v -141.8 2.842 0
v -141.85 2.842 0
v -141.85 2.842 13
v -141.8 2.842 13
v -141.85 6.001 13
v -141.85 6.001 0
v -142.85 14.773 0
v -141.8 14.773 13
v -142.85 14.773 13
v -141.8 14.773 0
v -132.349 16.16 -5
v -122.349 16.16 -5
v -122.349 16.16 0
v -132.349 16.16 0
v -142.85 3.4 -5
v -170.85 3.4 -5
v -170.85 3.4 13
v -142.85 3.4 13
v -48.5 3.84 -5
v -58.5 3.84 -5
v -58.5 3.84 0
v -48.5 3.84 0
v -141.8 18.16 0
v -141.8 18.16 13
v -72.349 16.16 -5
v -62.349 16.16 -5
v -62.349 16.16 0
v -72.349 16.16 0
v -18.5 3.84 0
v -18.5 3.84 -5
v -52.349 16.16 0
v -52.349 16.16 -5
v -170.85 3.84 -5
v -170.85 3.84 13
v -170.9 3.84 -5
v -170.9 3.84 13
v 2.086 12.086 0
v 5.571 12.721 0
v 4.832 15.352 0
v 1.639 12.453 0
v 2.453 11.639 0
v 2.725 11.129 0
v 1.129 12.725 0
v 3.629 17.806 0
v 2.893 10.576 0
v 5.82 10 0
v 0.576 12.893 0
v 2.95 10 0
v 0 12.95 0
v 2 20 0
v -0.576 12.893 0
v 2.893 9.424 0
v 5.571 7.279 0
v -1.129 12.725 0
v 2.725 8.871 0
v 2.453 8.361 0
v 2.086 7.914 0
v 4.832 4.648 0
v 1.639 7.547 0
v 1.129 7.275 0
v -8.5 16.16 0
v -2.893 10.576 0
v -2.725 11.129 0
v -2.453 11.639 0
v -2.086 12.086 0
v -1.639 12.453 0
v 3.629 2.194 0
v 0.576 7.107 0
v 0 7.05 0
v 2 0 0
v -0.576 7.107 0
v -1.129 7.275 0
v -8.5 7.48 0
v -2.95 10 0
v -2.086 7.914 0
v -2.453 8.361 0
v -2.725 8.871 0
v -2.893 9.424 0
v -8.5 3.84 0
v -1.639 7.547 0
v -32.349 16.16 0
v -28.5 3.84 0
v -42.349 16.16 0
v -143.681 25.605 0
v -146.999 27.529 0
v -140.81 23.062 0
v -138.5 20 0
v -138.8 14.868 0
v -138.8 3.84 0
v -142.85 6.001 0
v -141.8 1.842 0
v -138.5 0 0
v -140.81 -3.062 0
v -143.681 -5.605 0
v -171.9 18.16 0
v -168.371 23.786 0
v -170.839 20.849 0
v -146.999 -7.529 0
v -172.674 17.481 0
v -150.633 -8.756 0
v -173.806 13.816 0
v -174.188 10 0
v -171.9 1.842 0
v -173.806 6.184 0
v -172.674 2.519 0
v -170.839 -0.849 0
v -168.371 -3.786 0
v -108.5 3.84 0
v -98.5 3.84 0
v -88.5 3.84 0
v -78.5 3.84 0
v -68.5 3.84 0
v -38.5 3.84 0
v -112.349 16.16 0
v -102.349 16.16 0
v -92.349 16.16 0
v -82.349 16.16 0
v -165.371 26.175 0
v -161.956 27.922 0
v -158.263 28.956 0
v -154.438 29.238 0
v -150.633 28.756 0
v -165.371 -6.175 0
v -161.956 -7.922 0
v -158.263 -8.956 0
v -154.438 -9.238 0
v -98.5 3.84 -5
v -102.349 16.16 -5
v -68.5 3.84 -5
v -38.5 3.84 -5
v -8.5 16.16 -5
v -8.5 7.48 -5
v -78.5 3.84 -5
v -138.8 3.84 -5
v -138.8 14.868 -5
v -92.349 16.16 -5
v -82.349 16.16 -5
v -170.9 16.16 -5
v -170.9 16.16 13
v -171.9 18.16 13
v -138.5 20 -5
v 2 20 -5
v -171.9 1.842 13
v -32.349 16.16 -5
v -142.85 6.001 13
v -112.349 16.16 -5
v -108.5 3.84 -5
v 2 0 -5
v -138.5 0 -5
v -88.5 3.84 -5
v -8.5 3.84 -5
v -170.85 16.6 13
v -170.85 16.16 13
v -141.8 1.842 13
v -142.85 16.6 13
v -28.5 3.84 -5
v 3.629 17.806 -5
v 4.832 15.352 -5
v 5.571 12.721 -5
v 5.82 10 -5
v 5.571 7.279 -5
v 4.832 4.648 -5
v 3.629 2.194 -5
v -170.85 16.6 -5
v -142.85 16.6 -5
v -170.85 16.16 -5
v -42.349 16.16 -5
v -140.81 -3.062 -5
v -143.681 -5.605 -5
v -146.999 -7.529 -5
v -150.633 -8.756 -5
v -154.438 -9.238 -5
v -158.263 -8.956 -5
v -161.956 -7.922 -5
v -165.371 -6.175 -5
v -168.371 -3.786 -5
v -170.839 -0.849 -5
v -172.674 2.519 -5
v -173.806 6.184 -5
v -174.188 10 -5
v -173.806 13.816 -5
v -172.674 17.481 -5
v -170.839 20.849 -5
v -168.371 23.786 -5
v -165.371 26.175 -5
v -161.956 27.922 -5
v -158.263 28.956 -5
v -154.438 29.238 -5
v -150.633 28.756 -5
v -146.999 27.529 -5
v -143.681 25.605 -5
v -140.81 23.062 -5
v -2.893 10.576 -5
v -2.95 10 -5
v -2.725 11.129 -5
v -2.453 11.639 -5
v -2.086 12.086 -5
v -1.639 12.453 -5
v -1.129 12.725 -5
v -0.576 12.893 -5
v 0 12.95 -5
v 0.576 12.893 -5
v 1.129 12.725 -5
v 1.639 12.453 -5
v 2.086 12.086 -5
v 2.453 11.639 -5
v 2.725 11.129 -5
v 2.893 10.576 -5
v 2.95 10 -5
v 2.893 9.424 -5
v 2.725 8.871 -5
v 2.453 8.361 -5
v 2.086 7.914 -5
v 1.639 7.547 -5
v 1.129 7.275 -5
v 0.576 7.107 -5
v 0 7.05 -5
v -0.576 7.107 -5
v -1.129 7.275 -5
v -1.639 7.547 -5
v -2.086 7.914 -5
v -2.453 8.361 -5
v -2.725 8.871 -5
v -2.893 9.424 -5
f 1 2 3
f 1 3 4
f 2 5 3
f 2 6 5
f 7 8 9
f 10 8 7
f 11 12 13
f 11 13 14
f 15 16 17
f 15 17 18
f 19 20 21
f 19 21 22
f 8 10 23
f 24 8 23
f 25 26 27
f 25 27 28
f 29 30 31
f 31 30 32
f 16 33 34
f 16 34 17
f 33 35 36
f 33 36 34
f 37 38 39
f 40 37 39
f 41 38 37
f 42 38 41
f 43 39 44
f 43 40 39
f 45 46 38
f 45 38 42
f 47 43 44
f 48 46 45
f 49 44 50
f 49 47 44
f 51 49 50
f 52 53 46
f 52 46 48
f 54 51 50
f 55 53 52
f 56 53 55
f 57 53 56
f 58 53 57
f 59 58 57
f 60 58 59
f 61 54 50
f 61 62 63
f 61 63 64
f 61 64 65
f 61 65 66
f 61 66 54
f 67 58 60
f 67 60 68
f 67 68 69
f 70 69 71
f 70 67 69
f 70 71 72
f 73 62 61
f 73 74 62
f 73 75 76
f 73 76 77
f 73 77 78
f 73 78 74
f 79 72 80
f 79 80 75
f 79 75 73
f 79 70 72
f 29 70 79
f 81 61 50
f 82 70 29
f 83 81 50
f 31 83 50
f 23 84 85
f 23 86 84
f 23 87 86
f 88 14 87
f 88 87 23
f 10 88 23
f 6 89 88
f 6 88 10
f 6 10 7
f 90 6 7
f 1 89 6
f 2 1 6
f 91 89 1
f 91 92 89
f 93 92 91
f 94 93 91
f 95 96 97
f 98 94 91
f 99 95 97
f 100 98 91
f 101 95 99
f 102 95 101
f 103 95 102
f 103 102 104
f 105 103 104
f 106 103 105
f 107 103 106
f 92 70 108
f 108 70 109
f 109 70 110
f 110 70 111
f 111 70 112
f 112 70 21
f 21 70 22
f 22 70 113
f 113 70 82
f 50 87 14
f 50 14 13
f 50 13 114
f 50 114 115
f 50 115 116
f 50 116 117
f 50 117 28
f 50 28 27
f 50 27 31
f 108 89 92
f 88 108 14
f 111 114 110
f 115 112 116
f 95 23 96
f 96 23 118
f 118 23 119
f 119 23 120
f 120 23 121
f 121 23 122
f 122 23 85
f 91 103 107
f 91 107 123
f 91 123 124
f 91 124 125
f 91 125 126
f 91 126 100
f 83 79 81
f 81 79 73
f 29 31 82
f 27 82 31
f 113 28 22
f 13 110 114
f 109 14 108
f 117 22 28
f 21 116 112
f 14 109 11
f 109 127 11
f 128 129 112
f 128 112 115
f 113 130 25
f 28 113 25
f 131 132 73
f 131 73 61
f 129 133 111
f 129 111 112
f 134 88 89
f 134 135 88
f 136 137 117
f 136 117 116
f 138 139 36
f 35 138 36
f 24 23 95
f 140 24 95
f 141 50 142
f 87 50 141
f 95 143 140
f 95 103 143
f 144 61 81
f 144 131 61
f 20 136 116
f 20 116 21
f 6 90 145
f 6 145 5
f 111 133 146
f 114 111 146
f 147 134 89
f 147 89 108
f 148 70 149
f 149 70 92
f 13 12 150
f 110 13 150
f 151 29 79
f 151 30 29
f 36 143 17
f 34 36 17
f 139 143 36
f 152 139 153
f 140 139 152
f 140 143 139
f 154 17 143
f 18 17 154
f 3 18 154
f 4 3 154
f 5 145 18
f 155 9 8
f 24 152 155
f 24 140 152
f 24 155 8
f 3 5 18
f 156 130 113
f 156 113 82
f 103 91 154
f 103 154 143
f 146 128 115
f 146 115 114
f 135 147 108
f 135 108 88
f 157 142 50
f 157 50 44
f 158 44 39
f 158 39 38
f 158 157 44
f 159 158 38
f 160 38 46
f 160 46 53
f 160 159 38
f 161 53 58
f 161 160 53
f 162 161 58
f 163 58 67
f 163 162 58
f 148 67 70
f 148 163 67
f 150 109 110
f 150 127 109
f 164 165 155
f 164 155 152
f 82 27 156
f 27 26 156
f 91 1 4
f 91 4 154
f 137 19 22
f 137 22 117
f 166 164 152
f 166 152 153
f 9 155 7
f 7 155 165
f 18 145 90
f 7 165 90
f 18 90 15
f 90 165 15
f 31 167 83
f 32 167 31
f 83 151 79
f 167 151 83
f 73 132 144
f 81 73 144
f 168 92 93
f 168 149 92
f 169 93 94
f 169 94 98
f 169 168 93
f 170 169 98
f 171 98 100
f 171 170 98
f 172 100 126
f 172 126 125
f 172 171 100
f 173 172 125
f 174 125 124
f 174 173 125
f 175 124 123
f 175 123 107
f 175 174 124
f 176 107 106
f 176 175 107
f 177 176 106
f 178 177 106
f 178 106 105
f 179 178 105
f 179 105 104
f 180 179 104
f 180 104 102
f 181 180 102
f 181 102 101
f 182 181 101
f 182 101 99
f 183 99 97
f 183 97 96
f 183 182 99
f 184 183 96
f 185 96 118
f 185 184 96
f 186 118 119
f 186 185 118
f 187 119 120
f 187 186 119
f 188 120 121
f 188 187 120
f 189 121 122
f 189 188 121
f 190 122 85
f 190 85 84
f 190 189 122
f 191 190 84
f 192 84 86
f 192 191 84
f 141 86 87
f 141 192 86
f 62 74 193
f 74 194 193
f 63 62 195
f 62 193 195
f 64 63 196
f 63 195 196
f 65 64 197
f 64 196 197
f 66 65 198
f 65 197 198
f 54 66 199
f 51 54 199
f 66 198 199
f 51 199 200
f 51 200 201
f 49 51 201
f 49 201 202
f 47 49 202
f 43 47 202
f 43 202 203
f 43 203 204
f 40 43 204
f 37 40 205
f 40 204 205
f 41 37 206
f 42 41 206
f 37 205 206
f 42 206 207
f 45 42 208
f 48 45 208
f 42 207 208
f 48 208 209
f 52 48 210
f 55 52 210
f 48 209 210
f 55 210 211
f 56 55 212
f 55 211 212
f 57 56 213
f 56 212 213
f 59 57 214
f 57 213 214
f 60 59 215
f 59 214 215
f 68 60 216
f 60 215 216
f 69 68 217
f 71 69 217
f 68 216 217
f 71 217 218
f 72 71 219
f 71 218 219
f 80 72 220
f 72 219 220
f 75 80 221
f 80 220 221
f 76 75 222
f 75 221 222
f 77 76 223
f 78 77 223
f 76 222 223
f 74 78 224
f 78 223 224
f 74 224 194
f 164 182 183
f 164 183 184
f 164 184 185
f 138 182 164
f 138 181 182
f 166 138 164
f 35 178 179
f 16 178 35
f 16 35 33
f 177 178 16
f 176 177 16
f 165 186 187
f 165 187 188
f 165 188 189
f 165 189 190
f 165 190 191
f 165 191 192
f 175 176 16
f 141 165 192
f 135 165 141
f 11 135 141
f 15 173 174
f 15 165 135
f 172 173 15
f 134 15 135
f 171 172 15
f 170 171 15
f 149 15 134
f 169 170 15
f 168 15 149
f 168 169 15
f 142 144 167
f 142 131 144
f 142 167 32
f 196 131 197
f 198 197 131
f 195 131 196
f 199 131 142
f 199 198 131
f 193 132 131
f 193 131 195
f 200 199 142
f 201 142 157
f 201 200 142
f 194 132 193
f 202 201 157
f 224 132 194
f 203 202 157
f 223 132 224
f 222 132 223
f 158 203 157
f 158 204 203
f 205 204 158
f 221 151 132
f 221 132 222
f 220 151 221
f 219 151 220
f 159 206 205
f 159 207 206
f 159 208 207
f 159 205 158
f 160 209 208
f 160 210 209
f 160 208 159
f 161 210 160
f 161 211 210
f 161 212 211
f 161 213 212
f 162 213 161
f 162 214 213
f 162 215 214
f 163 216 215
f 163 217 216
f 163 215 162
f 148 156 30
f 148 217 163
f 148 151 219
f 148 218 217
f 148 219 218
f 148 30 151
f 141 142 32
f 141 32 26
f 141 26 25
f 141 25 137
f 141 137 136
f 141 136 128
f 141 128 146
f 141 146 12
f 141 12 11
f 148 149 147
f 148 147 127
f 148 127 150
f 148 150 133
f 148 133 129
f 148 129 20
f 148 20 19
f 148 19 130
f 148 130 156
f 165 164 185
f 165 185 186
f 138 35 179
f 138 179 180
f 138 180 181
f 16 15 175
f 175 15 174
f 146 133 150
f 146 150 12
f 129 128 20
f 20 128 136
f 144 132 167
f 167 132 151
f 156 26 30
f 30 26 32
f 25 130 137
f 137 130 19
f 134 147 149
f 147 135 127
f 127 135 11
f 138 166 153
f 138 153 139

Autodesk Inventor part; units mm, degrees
ref_plane "YZ Plane" through (0, 0, 0) normal (1, 0, 0) x (0, 1, 0)
ref_plane "XZ Plane" through (0, 0, 0) normal (0, 1, 0) x (-1, 0, 0)
ref_plane "XY Plane" through (0, 0, 0) normal (0, 0, 1) x (1, 0, 0)
sketch "Szkic1" plane through (0, 0, 0) normal (0, 1, 0) x (-1, 0, 0)
  line L0 (0, 0) -> (150, 0)
  line L1 (150, 0) -> (150, -5)
  line L2 (150, -5) -> (0, -5)
  line L3 (0, -5) -> (0, 0)
  dimension "d0" = 150
  dimension "d1" = 5
extrude "Wyciągnięcie proste1" add sketch "Szkic1" along normal blind 20
sketch "Szkic2" plane through (0, 0, -5) normal (0, 0, -1) x (-1, 0, 0)
  line L0 (0, 0) -> (0, 20) projected
  circle A0 centre (0, 10) radius 2.95
  line L1 (0, 20) -> (-2, 20)
  line L2 (0, 0) -> (-2, 0)
  arc A1 (-2, 20) -> (-2, 0) centre (9.1803, 10) ccw
  line L3 (0, 10) -> (150, 10)
  line L4 (150, 10) -> (138.5, 10)
  line L5 (138.5, 10) -> (170.9, 10)
  line L6 (150, 0) -> (150, 20) projected
  line L7 (138.5, 10) -> (170.9, 10) construction
  line L8 (138.5, 10) -> (170.9, 10)
  line L9 (170.9, 10) -> (170.9, 16.16)
  line L10 (170.9, 16.16) -> (138.5, 16.16)
  line L11 (138.5, 16.16) -> (138.5, 10)
  line L12 (138.5, 10) -> (170.9, 10)
  line L13 (170.9, 10) -> (170.9, 3.84)
  line L14 (170.9, 3.84) -> (138.5, 3.84)
  line L15 (138.5, 3.84) -> (138.5, 10)
  line L16 (0, 0) -> (150, 0) projected
  line L17 (0, 20) -> (150, 20) projected
  arc A2 (138.5, 0) -> (138.5, 20) centre (154.9429, 10) ccw
  point P0 (150, 3.84)
  point P1 (150, 16.16)
  point P2 (0, 7.05)
  point P3 (0, 12.95)
  dimension "d4" = 5.9
  dimension "d5" = 2
  dimension "d6" = 2
  dimension "d7" = 15
  dimension "d8" = 150
  dimension "d9" = 11.5
  dimension "d10" = 32.4
  dimension "d11" = 0
  dimension "d12" = 6.16
  dimension "d13" = 6.16
extrude "Wyciągnięcie proste2" add sketch "Szkic2" against normal blind 5 contours L2 A1 L1 L0 A0 | L16 L6 L14 L13 L9 L10 L17 A2
sketch "Szkic3" plane through (2, 20, -5) normal (0, 0, -1) x (-1, 0, 0)
  arc A0 (2, -7.05) -> (2, -12.95) centre (2, -10) ccw projected
  circle A1 centre (2, -10) radius 2.95
  line L0 (152, -16.16) -> (152, -3.84) projected
  line L1 (152, -16.16) -> (150.5, -16.16)
  line L2 (150.5, -16.16) -> (150.5, -3.84)
  line L3 (150.5, -3.84) -> (152, -3.84)
  line L4 (140.5, -16.16) -> (10.5, -16.16)
  line L5 (10.5, -16.16) -> (10.5, -3.84)
  line L6 (10.5, -3.84) -> (140.5, -3.84)
  line L7 (140.5, -3.84) -> (140.5, -16.16)
  line L8 (150.5, -16.16) -> (150.3, -16.16)
  line L9 (150.3, -16.16) -> (150.3, -3.84)
  line L10 (150.3, -3.84) -> (150.5, -3.84)
  line L11 (152, -16.16) -> (140.5, -16.16)
  line L12 (140.5, -16.16) -> (140.5, -3.84)
  line L13 (140.5, -3.84) -> (152, -3.84)
  line L14 (152, -3.84) -> (152, -16.16)
  point P0 (2, -20)
  dimension "d16" = 1.5
  dimension "d17" = 130
  dimension "d18" = 12.32
  dimension "d21" = 0.2
  dimension "d24" = 11.5
extrude "Wyciągnięcie proste3" cut sketch "Szkic3" against normal through all
sketch "Szkic5" plane through (2, 20, -5) normal (0, 0, -1) x (-1, 0, 0)
  circle A0 centre (2, -10) radius 2.95 projected
  line L0 (2, -10) -> (152, -10)
  line L1 (2, -10) -> (152, -10) construction
  circle A1 centre (152, -10) radius 5.0551
  line L2 (152, -10) -> (145.8, -10)
  line L3 (145.8, -10) -> (145.8, -3.84)
  line L4 (10.5, -3.84) -> (172.9, -3.84) projected
  line L5 (145.8, -3.84) -> (140.8, -3.84)
  line L6 (140.8, -3.84) -> (140.8, -16.16)
  line L7 (172.9, -16.16) -> (10.5, -16.16) projected
  line L8 (145.8, -10) -> (145.8, -16.16)
  line L9 (145.8, -16.16) -> (140.8, -16.16)
  line L10 (10.5, -16.16) -> (10.5, -3.84) projected
  line L11 (10.5, -16.16) -> (44.3489, -3.84)
  line L12 (10.5, -16.16) -> (46.5213, -16.16) construction
  line L13 (44.3489, -3.84) -> (54.3489, -3.84)
  line L14 (10.5, -16.16) -> (20.5, -16.16)
  line L15 (20.5, -16.16) -> (54.3489, -3.84)
  line L16 (20.5, -16.16) -> (30.5, -16.16)
  line L17 (54.3489, -3.84) -> (64.3489, -3.84)
  line L18 (64.3489, -3.84) -> (30.5, -16.16)
  line L19 (44.3489, -3.84) -> (34.3489, -3.84)
  line L20 (10.5, -16.16) -> (0.5, -16.16)
  line L21 (0.5, -16.16) -> (34.3489, -3.84)
  line L22 (40.5, -16.16) -> (74.3489, -3.84)
  line L23 (50.5, -16.16) -> (84.3489, -3.84)
  line L24 (94.3489, -3.84) -> (60.5, -16.16)
  line L25 (30.5, -16.16) -> (64.3489, -3.84)
  line L26 (70.5, -16.16) -> (104.3489, -3.84)
  line L27 (80.5, -16.16) -> (114.3489, -3.84)
  line L28 (124.3489, -3.84) -> (90.5, -16.16)
  line L29 (60.5, -16.16) -> (94.3489, -3.84)
  line L30 (100.5, -16.16) -> (134.3489, -3.84)
  line L31 (110.5, -16.16) -> (144.3489, -3.84)
  line L32 (90.5, -16.16) -> (124.3489, -3.84)
  point P0 (2, -20)
  point P1 (10.5, -12.5203)
  point P2 (60.5, -16.16)
  point P3 (140.8, -5.1317)
  dimension "d25" = 150
  dimension "d26" = 0
  dimension "d27" = 6.2
  dimension "d28" = 5
  dimension "d29" = 20
  dimension "d30" = 10
  dimension "d31" = 10
  dimension "d32" = 10
  dimension "d33" = 10
  dimension "d34" = 10
  dimension "d35" = 10
  dimension "d36" = 10
  dimension "d37" = 10
  dimension "d38" = 10
  dimension "d39" = 10
  dimension "d40" = 10
  dimension "d41" = 10
  dimension "d42" = 10
  dimension "d43" = 10
  dimension "d44" = 10
  dimension "d45" = 10
  dimension "d46" = 10
  dimension "d47" = 10
  dimension "d48" = 10
  dimension "d49" = 10
  dimension "d52" = 10
  dimension "d53" = 10
extrude "Wyciągnięcie proste4" add sketch "Szkic5" against normal blind 5 contours L21 L4 L11 L0 | L0 L11 L10 L21 | L15 L4 L18 L0 | L0 L18 L7 L15 | L22 L4 L23 L0 | L0 L23 L7 L22 | L24 L4 L26 L0 | L0 L26 L7 L24 | L27 L4 L28 L0 | L0 L28 L7 L27 | L30 L4 L6 L31 L0 | L0 L31 L7 L30 | L6 L31 L4 L3 L0 | L0 L8 L7 L6 | L6 L4 L31
sketch "Szkic6" plane through (-138.5, 0, 0) normal (0, 0, 1) x (1, 0, 0)
  line L0 (-32.4, 16.16) -> (-32.4, 3.84) projected
  line L1 (-5.3, 3.84) -> (-32.4, 3.84) projected
  line L2 (-32.4, 16.16) -> (-5.3, 16.16)
  line L3 (-5.3, 16.16) -> (-5.3, 3.84)
  line L4 (-5.3, 3.84) -> (-32.4, 3.84)
  line L5 (-32.4, 3.84) -> (-32.4, 16.16)
  line L6 (-32.4, 16.16) -> (-33.4, 16.16)
  line L7 (-33.4, 16.16) -> (-33.4, 17.16)
  line L8 (-5.3, 3.84) -> (-5.3, 2.84)
  line L9 (-5.3, 2.84) -> (-4.3, 2.84)
  line L10 (-33.4, 17.16) -> (-4.3, 17.16)
  line L11 (-4.3, 17.16) -> (-4.3, 2.84)
  line L12 (-4.3, 2.84) -> (-33.4, 2.84)
  line L13 (-33.4, 2.84) -> (-33.4, 17.16)
  point P0 (138.5, 0)
  point P1 (-33.4, 16.16)
  dimension "d56" = 1
  dimension "d57" = 1
  dimension "d58" = 1
  dimension "d59" = 1
extrude "Wyciągnięcie proste5" add sketch "Szkic6" along normal blind 13 contours L6 L7 L10 L11 L9 L8 L3 L2 | L0 L1 L8 L12 L13 L6
sketch "Szkic7" plane through (-142.8, 2.84, 0) normal (1, 0, 0) x (0, 0, -1)
  line L0 (-13, 0) -> (-13, 14.32) projected
  line L1 (0, 17.16) -> (0, -2.84) projected
  line L2 (-13, 11.9333) -> (0, 11.9333)
  line L3 (0, 11.9333) -> (0, 3.1608)
  line L4 (0, 3.1608) -> (-13, 3.1608)
  line L5 (-13, 3.1608) -> (-13, 11.9333)
extrude "Wyciągnięcie proste6" cut sketch "Szkic7" against normal blind 8.75
sketch "Szkic8" plane through (-138.5, 0, 0) normal (0, 0, 1) x (1, 0, 0)
  circle A0 centre (138.5, 10) radius 2.95 projected
  line L0 (138.5, 10) -> (-11.5, 10)
  circle A1 centre (-11.5, 10) radius 2.85
  line L1 (-14.35, 10) -> (-4.35, 10)
  line L2 (-4.35, 10) -> (-4.35, 16.6)
  line L3 (-4.35, 10) -> (2.25, 10) construction
  line L4 (-4.35, 10) -> (-4.35, 3.4)
  line L5 (-4.35, 16.6) -> (-32.35, 16.6)
  line L6 (-4.35, 16.6) -> (23.65, 16.6) construction
  line L7 (-32.35, 16.6) -> (-32.35, 3.4)
  line L8 (-32.35, 3.4) -> (-4.35, 3.4)
  point P0 (138.5, 0)
  dimension "d66" = 5.7
  dimension "d64" = 150
  dimension "d67" = 10
  dimension "d68" = 6.6
  dimension "d69" = 90
  dimension "d70" = 6.6
  dimension "d71" = 28
  dimension "d72" = 180
  dimension "d73" = 13.2
extrude "Wyciągnięcie proste7" cut sketch "Szkic8" along normal blind 22.75 and the other way blind 20.75 contours L4 L8 L7 L5 L2
sketch "Szkic10" plane through (-138.5, 0, 0) normal (0, 0, 1) x (1, 0, 0)
  line L0 (-4.3, 17.16) -> (-4.3, 14.7733) projected
  line L1 (-4.3, 14.7733) -> (-3.3, 14.7733)
  line L2 (-3.3, 14.7733) -> (-3.3, 17.16)
  line L3 (-3.3, 17.16) -> (-4.3, 17.16)
  line L4 (-4.3, 17.16) -> (-4.3, 14.7733)
  line L5 (-4.35, 14.7733) -> (-4.35, 6.0008) projected
  line L6 (-4.35, 6.0008) -> (-3.35, 6.0008)
  line L7 (-3.35, 6.0008) -> (-3.35, 2.8422)
  line L8 (-3.35, 2.8422) -> (-4.35, 2.8422)
  line L9 (-4.35, 2.8422) -> (-4.35, 6.0008)
  line L10 (-33.4, 17.16) -> (-4.3, 17.16) projected
  line L11 (-33.4, 17.16) -> (-3.3, 17.16)
  line L12 (-3.3, 17.16) -> (-3.3, 18.16)
  line L13 (-3.3, 18.16) -> (-33.4, 18.16)
  line L14 (-33.4, 18.16) -> (-33.4, 17.16)
  line L15 (-33.4, 2.8422) -> (-3.3, 2.8422)
  line L16 (-3.3, 2.8422) -> (-3.3, 1.8422)
  line L17 (-3.3, 1.8422) -> (-33.4, 1.8422)
  line L18 (-33.4, 1.8422) -> (-33.4, 2.8422)
  point P0 (138.5, 0)
  point P1 (-3.3, 17.16)
  point P2 (-3.35, 2.8422)
  dimension "d78" = 1
  dimension "d79" = 1
  dimension "d80" = 1
  dimension "d81" = 1
extrude "Wyciągnięcie proste8" add sketch "Szkic10" along normal blind 13
sketch "Szkic11" plane through (2, 20, -5) normal (0, 0, -1) x (-1, 0, 0)
  circle A0 centre (2, -10) radius 2.95 projected
  line L0 (2, -10) -> (152, -10)
  line L1 (2, -10) -> (152, -10) construction
  circle A1 centre (152, -10) radius 2.4946
  point P0 (2, -20)
  dimension "d84" = 150
  dimension "d85" = 0
properties part number "arm_v3-1_backup"
